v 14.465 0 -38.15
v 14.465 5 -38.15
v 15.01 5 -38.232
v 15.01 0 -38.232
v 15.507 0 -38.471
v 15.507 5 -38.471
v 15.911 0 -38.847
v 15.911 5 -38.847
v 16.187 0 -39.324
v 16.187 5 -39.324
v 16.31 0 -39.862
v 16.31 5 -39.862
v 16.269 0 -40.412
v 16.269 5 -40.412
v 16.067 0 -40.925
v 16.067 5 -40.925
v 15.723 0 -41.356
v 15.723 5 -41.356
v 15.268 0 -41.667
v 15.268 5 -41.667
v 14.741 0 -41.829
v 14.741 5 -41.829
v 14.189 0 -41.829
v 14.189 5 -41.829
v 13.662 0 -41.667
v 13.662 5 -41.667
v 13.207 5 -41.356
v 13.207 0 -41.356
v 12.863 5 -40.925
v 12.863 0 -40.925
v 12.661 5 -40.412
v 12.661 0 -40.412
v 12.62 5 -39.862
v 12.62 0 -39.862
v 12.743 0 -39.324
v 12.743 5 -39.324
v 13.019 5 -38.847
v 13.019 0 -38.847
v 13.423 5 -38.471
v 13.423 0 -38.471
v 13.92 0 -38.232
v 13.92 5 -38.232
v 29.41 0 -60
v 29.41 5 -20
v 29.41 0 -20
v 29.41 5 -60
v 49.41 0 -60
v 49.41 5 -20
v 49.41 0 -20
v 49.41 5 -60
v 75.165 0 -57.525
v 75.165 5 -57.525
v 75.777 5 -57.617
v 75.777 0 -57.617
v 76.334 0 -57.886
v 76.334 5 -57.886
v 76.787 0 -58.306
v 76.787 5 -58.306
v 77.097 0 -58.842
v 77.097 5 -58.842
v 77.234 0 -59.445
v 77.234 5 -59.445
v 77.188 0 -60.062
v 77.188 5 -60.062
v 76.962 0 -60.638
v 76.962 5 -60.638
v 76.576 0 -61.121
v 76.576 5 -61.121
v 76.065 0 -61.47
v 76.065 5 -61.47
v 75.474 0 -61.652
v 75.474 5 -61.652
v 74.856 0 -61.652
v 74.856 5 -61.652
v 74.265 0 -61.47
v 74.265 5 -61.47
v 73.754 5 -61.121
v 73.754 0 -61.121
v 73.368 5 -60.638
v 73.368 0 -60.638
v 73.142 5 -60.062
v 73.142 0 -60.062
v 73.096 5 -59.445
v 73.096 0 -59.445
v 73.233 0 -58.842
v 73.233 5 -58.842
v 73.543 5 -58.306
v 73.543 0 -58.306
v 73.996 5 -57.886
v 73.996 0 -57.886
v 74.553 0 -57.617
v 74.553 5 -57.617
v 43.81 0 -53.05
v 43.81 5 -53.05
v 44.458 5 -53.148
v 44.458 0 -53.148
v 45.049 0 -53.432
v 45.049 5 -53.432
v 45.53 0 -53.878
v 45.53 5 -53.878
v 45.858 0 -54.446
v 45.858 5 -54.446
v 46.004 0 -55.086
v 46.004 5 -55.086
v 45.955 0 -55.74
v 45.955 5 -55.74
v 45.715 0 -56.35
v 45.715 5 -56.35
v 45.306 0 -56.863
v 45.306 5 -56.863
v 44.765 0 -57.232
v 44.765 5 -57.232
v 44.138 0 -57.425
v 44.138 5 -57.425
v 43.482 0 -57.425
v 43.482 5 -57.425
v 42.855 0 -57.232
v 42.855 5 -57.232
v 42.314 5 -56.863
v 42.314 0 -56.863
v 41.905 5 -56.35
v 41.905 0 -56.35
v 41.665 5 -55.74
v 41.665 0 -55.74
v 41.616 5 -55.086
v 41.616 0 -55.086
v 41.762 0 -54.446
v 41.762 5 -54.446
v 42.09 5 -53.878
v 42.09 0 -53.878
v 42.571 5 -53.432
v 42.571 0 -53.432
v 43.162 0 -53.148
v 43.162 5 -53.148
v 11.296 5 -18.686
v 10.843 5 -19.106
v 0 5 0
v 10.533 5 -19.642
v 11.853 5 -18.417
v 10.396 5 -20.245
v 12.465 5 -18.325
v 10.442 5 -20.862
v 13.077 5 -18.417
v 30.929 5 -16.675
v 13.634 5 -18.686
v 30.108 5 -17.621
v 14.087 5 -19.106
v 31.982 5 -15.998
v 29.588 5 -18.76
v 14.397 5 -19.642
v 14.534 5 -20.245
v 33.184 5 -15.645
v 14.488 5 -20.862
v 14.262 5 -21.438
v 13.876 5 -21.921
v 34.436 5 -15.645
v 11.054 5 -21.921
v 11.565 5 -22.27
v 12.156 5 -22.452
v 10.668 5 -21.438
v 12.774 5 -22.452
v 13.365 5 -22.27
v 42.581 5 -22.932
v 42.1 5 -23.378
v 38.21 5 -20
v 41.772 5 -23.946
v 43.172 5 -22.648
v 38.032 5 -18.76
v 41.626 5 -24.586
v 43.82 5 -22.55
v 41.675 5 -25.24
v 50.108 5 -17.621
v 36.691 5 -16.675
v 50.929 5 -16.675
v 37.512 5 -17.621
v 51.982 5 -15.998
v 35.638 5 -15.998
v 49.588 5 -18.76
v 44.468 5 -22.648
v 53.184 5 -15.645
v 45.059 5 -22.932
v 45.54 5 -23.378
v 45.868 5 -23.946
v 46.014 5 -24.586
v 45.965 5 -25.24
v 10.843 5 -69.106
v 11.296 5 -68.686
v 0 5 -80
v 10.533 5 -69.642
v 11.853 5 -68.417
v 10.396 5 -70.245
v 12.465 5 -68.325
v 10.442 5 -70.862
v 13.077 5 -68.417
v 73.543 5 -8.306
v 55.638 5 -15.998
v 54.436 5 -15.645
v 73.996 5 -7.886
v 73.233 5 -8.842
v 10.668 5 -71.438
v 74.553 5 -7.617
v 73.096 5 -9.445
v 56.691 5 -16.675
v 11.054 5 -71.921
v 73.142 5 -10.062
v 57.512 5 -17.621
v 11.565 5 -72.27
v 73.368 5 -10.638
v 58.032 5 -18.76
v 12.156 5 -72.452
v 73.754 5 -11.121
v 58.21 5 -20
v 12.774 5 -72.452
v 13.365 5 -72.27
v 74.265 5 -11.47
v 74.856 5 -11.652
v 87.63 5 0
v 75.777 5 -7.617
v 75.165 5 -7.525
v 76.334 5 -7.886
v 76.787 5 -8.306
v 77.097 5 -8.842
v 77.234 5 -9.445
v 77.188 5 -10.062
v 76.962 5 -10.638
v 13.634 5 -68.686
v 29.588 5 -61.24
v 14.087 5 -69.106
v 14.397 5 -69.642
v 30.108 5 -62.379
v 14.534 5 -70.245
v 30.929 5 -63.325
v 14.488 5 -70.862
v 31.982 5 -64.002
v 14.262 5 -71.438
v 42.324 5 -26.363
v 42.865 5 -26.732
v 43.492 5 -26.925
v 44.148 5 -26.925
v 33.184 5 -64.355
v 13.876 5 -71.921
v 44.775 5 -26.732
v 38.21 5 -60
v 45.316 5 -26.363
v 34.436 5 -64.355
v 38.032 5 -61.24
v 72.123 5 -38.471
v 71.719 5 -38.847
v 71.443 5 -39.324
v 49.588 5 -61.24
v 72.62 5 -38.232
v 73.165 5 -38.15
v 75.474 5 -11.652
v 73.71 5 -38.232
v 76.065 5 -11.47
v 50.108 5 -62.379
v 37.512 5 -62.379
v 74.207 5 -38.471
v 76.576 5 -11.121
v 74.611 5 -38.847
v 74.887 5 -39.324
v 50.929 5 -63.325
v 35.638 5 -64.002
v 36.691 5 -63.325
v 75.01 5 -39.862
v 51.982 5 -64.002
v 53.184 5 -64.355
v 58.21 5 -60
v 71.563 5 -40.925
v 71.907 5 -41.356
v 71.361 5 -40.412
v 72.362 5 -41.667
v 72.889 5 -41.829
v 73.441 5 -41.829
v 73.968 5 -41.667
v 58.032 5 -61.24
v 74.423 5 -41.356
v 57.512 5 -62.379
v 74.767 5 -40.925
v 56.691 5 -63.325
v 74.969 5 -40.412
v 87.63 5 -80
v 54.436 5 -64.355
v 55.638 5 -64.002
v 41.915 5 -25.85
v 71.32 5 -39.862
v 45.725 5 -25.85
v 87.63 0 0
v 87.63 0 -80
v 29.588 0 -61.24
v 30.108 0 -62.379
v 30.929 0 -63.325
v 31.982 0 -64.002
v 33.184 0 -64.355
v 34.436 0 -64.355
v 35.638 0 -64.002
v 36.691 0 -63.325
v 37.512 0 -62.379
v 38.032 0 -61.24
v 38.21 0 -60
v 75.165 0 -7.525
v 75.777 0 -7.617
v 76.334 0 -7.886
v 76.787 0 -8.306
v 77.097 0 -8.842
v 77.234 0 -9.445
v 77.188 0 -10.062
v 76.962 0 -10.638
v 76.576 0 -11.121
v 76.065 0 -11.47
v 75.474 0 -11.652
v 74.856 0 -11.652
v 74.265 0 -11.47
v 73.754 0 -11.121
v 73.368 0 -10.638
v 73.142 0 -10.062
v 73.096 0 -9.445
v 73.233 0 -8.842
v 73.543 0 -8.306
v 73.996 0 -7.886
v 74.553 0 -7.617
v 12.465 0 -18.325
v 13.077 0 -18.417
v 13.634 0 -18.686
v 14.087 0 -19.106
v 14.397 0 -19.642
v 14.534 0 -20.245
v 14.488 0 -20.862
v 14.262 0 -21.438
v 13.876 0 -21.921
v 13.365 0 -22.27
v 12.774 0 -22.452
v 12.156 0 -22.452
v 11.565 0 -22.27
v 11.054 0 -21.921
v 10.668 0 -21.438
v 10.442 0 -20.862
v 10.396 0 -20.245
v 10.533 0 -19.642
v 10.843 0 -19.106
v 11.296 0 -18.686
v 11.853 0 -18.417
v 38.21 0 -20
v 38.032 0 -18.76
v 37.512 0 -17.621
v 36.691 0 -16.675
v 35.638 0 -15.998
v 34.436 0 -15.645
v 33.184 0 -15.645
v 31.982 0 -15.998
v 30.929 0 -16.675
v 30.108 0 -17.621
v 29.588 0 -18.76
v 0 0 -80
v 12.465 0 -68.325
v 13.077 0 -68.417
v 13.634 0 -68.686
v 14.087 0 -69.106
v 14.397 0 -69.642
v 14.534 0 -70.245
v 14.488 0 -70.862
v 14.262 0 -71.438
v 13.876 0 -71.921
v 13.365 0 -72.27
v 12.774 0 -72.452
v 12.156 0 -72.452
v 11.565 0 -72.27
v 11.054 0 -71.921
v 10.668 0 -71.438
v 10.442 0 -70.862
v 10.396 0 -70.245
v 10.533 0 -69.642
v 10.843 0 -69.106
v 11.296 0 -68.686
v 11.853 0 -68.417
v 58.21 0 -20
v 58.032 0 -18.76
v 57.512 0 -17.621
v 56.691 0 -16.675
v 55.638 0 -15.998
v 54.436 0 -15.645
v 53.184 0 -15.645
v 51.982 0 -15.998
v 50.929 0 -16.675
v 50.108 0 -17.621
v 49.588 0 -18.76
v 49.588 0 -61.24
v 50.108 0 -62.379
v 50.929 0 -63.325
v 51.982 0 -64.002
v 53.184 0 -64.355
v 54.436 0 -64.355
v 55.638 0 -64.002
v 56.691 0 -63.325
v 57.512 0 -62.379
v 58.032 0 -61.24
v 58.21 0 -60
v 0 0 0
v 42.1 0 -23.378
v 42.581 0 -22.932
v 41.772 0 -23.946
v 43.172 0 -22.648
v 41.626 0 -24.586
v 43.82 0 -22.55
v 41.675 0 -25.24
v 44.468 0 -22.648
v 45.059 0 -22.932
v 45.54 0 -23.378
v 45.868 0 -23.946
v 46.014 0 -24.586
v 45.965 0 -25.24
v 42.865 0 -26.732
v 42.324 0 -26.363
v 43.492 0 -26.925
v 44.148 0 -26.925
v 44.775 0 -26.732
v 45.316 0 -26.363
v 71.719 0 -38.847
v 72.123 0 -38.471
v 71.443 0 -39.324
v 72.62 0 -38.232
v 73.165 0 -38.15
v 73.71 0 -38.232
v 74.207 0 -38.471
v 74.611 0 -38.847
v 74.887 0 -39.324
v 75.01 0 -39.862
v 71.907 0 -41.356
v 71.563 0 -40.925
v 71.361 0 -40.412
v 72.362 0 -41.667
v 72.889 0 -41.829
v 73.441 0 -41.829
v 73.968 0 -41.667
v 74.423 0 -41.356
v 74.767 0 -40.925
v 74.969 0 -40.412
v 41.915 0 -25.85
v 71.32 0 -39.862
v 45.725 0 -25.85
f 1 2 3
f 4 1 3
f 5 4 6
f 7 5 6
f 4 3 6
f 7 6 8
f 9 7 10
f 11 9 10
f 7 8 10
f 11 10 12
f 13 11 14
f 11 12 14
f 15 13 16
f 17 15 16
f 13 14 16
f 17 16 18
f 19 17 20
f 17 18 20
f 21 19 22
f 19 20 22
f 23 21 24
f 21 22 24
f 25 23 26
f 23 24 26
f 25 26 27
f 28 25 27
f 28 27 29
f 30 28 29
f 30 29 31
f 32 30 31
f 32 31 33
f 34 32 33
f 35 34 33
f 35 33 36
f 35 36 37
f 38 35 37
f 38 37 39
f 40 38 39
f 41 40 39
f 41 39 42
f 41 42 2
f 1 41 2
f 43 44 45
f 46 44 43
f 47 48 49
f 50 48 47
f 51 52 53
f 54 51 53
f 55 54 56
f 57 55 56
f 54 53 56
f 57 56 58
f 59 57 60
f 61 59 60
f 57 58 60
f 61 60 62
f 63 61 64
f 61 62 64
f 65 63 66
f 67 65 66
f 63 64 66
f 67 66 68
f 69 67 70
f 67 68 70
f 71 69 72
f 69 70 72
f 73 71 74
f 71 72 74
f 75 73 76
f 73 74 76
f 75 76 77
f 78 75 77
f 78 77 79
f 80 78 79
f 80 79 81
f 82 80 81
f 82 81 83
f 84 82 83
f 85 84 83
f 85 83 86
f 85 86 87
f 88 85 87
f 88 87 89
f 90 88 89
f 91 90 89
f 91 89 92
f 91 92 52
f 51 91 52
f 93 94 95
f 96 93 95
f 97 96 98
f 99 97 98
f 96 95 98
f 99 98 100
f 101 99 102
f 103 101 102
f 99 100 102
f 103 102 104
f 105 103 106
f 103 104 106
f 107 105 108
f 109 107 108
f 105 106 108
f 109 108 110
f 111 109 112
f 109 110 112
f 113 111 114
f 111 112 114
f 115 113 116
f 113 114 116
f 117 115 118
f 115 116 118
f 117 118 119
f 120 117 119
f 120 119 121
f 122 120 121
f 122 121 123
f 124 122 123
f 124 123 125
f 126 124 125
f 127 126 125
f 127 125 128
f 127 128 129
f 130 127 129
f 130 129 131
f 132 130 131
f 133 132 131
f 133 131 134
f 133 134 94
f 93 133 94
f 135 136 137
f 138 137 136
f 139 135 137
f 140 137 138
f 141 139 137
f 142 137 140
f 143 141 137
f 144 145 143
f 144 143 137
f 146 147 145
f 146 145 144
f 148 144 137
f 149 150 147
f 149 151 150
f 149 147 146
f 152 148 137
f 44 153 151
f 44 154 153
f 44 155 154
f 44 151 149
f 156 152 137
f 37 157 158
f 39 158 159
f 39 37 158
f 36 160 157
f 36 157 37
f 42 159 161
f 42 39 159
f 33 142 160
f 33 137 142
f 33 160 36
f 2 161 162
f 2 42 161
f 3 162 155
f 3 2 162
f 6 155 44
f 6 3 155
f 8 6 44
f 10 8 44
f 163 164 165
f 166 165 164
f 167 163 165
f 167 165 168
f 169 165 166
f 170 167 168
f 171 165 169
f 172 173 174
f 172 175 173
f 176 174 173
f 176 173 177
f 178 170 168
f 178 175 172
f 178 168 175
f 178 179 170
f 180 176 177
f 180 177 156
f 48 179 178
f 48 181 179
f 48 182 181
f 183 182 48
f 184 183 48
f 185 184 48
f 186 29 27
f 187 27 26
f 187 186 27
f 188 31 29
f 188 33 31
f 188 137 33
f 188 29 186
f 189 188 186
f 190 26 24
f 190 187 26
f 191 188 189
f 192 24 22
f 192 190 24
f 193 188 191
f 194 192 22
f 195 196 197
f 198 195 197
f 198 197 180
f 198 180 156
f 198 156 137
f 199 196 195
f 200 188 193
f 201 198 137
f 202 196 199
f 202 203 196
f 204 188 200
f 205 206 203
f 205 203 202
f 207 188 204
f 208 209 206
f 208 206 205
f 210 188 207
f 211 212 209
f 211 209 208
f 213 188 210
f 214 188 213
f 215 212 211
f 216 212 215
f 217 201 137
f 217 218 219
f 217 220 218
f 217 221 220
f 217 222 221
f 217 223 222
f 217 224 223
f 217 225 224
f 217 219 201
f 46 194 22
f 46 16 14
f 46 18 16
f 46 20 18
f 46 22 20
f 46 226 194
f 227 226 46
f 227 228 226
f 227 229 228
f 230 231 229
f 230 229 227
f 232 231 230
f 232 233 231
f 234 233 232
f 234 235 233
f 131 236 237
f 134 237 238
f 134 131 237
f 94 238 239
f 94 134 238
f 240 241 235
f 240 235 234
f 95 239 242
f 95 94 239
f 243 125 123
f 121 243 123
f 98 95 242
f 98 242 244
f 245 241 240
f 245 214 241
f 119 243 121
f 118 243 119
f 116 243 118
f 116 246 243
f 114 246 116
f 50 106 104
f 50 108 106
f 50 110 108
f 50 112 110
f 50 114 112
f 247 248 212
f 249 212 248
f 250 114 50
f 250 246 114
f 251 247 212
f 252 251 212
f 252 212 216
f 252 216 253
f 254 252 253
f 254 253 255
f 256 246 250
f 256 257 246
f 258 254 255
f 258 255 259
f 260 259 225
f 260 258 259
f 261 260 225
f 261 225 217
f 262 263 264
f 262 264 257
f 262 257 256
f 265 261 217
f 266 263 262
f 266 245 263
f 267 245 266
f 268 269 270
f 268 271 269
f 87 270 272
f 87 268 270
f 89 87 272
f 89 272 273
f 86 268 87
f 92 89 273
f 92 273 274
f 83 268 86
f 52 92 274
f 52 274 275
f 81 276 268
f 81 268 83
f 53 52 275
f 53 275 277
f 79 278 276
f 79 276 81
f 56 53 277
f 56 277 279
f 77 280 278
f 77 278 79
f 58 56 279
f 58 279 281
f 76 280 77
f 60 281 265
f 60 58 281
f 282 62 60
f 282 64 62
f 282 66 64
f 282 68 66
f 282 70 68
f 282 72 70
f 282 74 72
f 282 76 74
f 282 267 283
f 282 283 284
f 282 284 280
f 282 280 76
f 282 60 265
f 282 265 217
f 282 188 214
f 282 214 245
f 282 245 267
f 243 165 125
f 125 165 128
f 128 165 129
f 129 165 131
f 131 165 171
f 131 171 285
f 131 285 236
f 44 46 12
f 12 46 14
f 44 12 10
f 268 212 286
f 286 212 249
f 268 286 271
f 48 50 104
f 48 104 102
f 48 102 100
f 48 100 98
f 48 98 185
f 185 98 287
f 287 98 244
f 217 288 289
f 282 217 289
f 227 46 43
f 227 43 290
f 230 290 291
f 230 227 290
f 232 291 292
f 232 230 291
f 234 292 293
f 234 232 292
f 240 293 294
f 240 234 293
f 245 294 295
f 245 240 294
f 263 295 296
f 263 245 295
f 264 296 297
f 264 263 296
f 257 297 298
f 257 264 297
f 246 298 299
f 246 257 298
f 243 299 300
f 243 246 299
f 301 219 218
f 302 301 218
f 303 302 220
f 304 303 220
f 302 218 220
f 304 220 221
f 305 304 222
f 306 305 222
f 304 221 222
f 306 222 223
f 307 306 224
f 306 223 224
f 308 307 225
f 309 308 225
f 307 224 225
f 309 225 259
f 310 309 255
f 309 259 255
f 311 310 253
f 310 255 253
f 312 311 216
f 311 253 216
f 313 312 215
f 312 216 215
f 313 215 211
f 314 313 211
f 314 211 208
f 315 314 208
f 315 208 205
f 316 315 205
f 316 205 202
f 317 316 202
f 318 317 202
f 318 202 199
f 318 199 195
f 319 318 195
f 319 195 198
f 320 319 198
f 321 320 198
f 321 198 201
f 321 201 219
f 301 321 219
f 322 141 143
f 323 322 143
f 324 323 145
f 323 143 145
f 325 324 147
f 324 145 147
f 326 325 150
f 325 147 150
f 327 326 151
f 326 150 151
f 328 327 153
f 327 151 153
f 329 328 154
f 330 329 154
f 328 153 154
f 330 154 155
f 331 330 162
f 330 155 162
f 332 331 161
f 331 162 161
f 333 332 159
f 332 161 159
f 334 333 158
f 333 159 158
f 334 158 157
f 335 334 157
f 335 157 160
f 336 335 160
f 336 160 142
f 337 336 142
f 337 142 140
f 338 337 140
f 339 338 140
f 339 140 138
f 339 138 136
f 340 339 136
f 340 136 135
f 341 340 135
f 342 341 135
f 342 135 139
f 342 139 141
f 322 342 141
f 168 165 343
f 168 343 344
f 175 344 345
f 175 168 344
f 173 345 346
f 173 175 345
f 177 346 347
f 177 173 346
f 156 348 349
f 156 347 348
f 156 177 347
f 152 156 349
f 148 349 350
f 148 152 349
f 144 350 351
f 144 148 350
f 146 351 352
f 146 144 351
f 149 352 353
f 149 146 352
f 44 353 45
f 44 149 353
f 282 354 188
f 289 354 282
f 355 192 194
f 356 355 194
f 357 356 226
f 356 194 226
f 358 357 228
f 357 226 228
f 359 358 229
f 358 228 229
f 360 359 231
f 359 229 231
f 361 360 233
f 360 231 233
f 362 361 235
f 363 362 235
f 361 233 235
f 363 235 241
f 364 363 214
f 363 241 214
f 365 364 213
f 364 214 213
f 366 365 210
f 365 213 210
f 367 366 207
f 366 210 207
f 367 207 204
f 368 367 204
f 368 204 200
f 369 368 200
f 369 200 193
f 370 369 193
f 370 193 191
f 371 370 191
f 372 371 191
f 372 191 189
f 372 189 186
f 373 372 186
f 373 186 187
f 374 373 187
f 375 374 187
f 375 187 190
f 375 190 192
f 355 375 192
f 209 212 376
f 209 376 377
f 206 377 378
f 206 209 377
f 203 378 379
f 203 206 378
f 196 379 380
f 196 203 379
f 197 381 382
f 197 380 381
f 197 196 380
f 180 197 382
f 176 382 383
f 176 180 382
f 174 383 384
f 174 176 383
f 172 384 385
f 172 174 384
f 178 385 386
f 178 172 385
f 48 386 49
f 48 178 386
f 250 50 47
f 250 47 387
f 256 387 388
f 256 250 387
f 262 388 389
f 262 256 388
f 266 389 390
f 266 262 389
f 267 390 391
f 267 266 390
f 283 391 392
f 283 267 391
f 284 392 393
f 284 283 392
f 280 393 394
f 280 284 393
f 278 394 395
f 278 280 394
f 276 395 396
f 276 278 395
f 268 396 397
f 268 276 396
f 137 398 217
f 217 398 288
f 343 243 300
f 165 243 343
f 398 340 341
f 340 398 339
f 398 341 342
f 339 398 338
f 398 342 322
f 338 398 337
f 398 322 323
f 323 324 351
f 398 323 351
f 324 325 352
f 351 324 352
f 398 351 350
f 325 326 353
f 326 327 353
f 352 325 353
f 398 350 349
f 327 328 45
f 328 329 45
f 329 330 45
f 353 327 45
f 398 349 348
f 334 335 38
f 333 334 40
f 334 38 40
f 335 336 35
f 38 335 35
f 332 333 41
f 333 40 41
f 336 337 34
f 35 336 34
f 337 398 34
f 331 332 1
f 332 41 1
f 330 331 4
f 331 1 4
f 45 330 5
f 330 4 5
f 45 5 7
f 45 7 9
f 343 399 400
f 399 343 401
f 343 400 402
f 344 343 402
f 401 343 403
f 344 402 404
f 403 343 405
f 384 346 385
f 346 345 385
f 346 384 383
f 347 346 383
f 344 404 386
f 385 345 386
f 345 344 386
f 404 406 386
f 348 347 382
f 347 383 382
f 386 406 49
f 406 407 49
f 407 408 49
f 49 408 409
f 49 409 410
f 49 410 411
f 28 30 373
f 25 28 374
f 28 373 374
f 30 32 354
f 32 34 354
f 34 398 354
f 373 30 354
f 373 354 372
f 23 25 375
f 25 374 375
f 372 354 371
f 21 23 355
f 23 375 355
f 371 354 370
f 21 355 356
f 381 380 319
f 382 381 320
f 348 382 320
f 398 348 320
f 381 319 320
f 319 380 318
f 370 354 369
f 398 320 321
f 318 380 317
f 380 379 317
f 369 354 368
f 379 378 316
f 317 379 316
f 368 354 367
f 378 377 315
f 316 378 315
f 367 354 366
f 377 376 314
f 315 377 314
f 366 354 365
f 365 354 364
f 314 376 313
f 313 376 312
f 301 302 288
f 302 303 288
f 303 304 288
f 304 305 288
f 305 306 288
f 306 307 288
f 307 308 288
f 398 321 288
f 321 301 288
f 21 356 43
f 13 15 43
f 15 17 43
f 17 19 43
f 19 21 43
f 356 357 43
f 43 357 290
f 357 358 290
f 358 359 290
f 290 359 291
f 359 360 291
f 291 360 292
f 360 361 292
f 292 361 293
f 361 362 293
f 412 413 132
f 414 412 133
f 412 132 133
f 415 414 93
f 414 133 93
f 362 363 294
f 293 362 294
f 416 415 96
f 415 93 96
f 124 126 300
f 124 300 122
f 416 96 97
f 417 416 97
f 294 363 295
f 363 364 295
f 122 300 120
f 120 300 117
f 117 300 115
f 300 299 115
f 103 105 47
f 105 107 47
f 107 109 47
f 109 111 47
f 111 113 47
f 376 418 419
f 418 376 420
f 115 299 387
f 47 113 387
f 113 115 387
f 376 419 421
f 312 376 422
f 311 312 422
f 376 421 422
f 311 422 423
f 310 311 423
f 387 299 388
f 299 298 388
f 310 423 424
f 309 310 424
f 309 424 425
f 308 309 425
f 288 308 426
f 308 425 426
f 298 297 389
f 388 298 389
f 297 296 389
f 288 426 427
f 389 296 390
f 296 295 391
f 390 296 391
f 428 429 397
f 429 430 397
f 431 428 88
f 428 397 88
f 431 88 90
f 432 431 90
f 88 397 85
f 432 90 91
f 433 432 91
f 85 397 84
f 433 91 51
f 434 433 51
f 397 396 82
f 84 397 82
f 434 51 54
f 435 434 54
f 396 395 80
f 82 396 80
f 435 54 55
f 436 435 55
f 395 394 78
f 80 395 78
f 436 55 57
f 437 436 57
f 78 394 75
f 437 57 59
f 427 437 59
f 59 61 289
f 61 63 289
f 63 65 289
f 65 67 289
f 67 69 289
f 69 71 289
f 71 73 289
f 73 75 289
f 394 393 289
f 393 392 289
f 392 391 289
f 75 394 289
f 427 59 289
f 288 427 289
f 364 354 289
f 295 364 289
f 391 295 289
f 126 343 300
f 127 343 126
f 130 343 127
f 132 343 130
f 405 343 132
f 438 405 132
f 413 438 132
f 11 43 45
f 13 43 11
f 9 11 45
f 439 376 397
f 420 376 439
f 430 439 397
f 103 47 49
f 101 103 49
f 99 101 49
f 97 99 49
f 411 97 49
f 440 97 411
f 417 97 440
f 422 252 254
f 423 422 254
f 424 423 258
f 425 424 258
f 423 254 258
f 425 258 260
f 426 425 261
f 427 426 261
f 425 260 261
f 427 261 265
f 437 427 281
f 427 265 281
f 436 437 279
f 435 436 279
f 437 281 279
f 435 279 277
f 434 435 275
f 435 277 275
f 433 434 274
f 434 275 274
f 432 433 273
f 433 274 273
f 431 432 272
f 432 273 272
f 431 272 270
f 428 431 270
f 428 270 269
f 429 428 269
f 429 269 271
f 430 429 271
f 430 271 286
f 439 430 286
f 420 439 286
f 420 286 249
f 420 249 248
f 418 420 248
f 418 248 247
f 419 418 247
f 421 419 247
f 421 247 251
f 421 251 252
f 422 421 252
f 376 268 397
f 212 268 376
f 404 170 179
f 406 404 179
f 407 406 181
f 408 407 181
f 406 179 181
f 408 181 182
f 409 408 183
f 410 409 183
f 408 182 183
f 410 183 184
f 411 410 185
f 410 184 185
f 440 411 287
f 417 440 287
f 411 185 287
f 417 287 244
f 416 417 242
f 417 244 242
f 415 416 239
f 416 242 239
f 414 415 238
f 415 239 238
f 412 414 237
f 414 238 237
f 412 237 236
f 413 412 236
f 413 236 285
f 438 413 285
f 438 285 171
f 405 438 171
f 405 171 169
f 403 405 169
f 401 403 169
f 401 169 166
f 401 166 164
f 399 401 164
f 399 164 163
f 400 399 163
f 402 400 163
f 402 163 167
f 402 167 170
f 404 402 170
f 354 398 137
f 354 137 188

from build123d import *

# Parameters (mm, degrees)
SKETCH1_W           = 87.63
SKETCH1_H           = 80
BOSS_EXTRUDE1_DEPTH = 5
SKETCH2_R           = 2.075
SKETCH2_R_2         = 1.85
CUT_EXTRUDE1_DEPTH  = 6
CUT_EXTRUDE2_REACH  = 7
SKETCH3_R           = 2.2
CUT_EXTRUDE3_REACH  = 7


with BuildPart() as part:
    # Sketch1 → Boss-Extrude1 (new body)
    with BuildSketch(Plane(origin=(0, 0, 0), x_dir=(1, 0, 0), z_dir=(0, 1, 0))):
        with Locations((43.815, 40)):
            Rectangle(SKETCH1_W, SKETCH1_H)
    extrude(amount=BOSS_EXTRUDE1_DEPTH)

    # Sketch2 → Cut-Extrude1 (cut, through all)
    with BuildSketch(Plane(origin=(0, 5, 0), x_dir=(1, 0, 0), z_dir=(0, 1, 0))):
        with Locations(Location((12.465, 70.4, 0), (0, 0, 270))):  # turned: the seam where the file's is
            Circle(SKETCH2_R)
        with Locations(Location((12.465, 20.4, 0), (0, 0, 270))):  # turned: the seam where the file's is
            Circle(SKETCH2_R)
        with Locations(Location((14.465, 40, 0), (0, 0, 270))):  # turned: the seam where the file's is
            Circle(SKETCH2_R_2)
        with Locations(Location((73.165, 40, 0), (0, 0, 270))):  # turned: the seam where the file's is
            Circle(SKETCH2_R_2)
        with Locations(Location((75.165, 9.6, 0), (0, 0, 270))):  # turned: the seam where the file's is
            Circle(SKETCH2_R)
        with Locations(Location((75.165, 59.6, 0), (0, 0, 270))):  # turned: the seam where the file's is
            Circle(SKETCH2_R)
    extrude(amount=-CUT_EXTRUDE1_DEPTH, mode=Mode.SUBTRACT)

    # Sketch3 → Cut-Extrude2 (cut, up to next)
    with BuildSketch(Plane(origin=(0, 5, 0), x_dir=(1, 0, 0), z_dir=(0, 1, 0)), mode=Mode.PRIVATE) as cut_extrude2_sk1:
        with Locations(Location((43.81, 55.25, 0), (0, 0, 270))):  # turned: the seam where the file's is
            Circle(SKETCH3_R)
    cut_extrude2_tool1 = extrude(cut_extrude2_sk1.sketch, amount=-CUT_EXTRUDE2_REACH, mode=Mode.PRIVATE) & part.part
    add(cut_extrude2_tool1.solids().sort_by_distance((43.81, 5, -55.25))[0], mode=Mode.SUBTRACT)
    # Sketch3 → Cut-Extrude2 (cut, up to next)
    with BuildSketch(Plane(origin=(0, 5, 0), x_dir=(1, 0, 0), z_dir=(0, 1, 0)), mode=Mode.PRIVATE) as cut_extrude2_sk2:
        with Locations(Location((43.82, 24.75, 0), (0, 0, 270))):  # turned: the seam where the file's is
            Circle(SKETCH3_R)
    cut_extrude2_tool2 = extrude(cut_extrude2_sk2.sketch, amount=-CUT_EXTRUDE2_REACH, mode=Mode.PRIVATE) & part.part
    add(cut_extrude2_tool2.solids().sort_by_distance((43.82, 5, -24.75))[0], mode=Mode.SUBTRACT)

    # Sketch4 → Cut-Extrude3 (cut, up to next)
    with BuildSketch(Plane(origin=(0, 5, 0), x_dir=(1, 0, 0), z_dir=(0, 1, 0)), mode=Mode.PRIVATE) as cut_extrude3_sk1:
        with BuildLine():
            Line((38.21, 60), (38.21, 20))
            ThreePointArc((38.21, 20), (33.81, 15.6), (29.41, 20))
            Line((29.41, 20), (29.41, 60))
            ThreePointArc((29.41, 60), (33.81, 64.4), (38.21, 60))
        make_face()
    cut_extrude3_tool1 = extrude(cut_extrude3_sk1.sketch, amount=-CUT_EXTRUDE3_REACH, mode=Mode.PRIVATE) & part.part
    add(cut_extrude3_tool1.solids().sort_by_distance((33.81, 5, -40))[0], mode=Mode.SUBTRACT)
    # Sketch4 → Cut-Extrude3 (cut, up to next)
    with BuildSketch(Plane(origin=(0, 5, 0), x_dir=(1, 0, 0), z_dir=(0, 1, 0)), mode=Mode.PRIVATE) as cut_extrude3_sk2:
        with BuildLine():
            Line((58.21, 60), (58.21, 20))
            ThreePointArc((58.21, 20), (53.81, 15.6), (49.41, 20))
            Line((49.41, 20), (49.41, 60))
            ThreePointArc((49.41, 60), (53.81, 64.4), (58.21, 60))
        make_face()
    cut_extrude3_tool2 = extrude(cut_extrude3_sk2.sketch, amount=-CUT_EXTRUDE3_REACH, mode=Mode.PRIVATE) & part.part
    add(cut_extrude3_tool2.solids().sort_by_distance((53.81, 5, -40))[0], mode=Mode.SUBTRACT)


solid = part.part
